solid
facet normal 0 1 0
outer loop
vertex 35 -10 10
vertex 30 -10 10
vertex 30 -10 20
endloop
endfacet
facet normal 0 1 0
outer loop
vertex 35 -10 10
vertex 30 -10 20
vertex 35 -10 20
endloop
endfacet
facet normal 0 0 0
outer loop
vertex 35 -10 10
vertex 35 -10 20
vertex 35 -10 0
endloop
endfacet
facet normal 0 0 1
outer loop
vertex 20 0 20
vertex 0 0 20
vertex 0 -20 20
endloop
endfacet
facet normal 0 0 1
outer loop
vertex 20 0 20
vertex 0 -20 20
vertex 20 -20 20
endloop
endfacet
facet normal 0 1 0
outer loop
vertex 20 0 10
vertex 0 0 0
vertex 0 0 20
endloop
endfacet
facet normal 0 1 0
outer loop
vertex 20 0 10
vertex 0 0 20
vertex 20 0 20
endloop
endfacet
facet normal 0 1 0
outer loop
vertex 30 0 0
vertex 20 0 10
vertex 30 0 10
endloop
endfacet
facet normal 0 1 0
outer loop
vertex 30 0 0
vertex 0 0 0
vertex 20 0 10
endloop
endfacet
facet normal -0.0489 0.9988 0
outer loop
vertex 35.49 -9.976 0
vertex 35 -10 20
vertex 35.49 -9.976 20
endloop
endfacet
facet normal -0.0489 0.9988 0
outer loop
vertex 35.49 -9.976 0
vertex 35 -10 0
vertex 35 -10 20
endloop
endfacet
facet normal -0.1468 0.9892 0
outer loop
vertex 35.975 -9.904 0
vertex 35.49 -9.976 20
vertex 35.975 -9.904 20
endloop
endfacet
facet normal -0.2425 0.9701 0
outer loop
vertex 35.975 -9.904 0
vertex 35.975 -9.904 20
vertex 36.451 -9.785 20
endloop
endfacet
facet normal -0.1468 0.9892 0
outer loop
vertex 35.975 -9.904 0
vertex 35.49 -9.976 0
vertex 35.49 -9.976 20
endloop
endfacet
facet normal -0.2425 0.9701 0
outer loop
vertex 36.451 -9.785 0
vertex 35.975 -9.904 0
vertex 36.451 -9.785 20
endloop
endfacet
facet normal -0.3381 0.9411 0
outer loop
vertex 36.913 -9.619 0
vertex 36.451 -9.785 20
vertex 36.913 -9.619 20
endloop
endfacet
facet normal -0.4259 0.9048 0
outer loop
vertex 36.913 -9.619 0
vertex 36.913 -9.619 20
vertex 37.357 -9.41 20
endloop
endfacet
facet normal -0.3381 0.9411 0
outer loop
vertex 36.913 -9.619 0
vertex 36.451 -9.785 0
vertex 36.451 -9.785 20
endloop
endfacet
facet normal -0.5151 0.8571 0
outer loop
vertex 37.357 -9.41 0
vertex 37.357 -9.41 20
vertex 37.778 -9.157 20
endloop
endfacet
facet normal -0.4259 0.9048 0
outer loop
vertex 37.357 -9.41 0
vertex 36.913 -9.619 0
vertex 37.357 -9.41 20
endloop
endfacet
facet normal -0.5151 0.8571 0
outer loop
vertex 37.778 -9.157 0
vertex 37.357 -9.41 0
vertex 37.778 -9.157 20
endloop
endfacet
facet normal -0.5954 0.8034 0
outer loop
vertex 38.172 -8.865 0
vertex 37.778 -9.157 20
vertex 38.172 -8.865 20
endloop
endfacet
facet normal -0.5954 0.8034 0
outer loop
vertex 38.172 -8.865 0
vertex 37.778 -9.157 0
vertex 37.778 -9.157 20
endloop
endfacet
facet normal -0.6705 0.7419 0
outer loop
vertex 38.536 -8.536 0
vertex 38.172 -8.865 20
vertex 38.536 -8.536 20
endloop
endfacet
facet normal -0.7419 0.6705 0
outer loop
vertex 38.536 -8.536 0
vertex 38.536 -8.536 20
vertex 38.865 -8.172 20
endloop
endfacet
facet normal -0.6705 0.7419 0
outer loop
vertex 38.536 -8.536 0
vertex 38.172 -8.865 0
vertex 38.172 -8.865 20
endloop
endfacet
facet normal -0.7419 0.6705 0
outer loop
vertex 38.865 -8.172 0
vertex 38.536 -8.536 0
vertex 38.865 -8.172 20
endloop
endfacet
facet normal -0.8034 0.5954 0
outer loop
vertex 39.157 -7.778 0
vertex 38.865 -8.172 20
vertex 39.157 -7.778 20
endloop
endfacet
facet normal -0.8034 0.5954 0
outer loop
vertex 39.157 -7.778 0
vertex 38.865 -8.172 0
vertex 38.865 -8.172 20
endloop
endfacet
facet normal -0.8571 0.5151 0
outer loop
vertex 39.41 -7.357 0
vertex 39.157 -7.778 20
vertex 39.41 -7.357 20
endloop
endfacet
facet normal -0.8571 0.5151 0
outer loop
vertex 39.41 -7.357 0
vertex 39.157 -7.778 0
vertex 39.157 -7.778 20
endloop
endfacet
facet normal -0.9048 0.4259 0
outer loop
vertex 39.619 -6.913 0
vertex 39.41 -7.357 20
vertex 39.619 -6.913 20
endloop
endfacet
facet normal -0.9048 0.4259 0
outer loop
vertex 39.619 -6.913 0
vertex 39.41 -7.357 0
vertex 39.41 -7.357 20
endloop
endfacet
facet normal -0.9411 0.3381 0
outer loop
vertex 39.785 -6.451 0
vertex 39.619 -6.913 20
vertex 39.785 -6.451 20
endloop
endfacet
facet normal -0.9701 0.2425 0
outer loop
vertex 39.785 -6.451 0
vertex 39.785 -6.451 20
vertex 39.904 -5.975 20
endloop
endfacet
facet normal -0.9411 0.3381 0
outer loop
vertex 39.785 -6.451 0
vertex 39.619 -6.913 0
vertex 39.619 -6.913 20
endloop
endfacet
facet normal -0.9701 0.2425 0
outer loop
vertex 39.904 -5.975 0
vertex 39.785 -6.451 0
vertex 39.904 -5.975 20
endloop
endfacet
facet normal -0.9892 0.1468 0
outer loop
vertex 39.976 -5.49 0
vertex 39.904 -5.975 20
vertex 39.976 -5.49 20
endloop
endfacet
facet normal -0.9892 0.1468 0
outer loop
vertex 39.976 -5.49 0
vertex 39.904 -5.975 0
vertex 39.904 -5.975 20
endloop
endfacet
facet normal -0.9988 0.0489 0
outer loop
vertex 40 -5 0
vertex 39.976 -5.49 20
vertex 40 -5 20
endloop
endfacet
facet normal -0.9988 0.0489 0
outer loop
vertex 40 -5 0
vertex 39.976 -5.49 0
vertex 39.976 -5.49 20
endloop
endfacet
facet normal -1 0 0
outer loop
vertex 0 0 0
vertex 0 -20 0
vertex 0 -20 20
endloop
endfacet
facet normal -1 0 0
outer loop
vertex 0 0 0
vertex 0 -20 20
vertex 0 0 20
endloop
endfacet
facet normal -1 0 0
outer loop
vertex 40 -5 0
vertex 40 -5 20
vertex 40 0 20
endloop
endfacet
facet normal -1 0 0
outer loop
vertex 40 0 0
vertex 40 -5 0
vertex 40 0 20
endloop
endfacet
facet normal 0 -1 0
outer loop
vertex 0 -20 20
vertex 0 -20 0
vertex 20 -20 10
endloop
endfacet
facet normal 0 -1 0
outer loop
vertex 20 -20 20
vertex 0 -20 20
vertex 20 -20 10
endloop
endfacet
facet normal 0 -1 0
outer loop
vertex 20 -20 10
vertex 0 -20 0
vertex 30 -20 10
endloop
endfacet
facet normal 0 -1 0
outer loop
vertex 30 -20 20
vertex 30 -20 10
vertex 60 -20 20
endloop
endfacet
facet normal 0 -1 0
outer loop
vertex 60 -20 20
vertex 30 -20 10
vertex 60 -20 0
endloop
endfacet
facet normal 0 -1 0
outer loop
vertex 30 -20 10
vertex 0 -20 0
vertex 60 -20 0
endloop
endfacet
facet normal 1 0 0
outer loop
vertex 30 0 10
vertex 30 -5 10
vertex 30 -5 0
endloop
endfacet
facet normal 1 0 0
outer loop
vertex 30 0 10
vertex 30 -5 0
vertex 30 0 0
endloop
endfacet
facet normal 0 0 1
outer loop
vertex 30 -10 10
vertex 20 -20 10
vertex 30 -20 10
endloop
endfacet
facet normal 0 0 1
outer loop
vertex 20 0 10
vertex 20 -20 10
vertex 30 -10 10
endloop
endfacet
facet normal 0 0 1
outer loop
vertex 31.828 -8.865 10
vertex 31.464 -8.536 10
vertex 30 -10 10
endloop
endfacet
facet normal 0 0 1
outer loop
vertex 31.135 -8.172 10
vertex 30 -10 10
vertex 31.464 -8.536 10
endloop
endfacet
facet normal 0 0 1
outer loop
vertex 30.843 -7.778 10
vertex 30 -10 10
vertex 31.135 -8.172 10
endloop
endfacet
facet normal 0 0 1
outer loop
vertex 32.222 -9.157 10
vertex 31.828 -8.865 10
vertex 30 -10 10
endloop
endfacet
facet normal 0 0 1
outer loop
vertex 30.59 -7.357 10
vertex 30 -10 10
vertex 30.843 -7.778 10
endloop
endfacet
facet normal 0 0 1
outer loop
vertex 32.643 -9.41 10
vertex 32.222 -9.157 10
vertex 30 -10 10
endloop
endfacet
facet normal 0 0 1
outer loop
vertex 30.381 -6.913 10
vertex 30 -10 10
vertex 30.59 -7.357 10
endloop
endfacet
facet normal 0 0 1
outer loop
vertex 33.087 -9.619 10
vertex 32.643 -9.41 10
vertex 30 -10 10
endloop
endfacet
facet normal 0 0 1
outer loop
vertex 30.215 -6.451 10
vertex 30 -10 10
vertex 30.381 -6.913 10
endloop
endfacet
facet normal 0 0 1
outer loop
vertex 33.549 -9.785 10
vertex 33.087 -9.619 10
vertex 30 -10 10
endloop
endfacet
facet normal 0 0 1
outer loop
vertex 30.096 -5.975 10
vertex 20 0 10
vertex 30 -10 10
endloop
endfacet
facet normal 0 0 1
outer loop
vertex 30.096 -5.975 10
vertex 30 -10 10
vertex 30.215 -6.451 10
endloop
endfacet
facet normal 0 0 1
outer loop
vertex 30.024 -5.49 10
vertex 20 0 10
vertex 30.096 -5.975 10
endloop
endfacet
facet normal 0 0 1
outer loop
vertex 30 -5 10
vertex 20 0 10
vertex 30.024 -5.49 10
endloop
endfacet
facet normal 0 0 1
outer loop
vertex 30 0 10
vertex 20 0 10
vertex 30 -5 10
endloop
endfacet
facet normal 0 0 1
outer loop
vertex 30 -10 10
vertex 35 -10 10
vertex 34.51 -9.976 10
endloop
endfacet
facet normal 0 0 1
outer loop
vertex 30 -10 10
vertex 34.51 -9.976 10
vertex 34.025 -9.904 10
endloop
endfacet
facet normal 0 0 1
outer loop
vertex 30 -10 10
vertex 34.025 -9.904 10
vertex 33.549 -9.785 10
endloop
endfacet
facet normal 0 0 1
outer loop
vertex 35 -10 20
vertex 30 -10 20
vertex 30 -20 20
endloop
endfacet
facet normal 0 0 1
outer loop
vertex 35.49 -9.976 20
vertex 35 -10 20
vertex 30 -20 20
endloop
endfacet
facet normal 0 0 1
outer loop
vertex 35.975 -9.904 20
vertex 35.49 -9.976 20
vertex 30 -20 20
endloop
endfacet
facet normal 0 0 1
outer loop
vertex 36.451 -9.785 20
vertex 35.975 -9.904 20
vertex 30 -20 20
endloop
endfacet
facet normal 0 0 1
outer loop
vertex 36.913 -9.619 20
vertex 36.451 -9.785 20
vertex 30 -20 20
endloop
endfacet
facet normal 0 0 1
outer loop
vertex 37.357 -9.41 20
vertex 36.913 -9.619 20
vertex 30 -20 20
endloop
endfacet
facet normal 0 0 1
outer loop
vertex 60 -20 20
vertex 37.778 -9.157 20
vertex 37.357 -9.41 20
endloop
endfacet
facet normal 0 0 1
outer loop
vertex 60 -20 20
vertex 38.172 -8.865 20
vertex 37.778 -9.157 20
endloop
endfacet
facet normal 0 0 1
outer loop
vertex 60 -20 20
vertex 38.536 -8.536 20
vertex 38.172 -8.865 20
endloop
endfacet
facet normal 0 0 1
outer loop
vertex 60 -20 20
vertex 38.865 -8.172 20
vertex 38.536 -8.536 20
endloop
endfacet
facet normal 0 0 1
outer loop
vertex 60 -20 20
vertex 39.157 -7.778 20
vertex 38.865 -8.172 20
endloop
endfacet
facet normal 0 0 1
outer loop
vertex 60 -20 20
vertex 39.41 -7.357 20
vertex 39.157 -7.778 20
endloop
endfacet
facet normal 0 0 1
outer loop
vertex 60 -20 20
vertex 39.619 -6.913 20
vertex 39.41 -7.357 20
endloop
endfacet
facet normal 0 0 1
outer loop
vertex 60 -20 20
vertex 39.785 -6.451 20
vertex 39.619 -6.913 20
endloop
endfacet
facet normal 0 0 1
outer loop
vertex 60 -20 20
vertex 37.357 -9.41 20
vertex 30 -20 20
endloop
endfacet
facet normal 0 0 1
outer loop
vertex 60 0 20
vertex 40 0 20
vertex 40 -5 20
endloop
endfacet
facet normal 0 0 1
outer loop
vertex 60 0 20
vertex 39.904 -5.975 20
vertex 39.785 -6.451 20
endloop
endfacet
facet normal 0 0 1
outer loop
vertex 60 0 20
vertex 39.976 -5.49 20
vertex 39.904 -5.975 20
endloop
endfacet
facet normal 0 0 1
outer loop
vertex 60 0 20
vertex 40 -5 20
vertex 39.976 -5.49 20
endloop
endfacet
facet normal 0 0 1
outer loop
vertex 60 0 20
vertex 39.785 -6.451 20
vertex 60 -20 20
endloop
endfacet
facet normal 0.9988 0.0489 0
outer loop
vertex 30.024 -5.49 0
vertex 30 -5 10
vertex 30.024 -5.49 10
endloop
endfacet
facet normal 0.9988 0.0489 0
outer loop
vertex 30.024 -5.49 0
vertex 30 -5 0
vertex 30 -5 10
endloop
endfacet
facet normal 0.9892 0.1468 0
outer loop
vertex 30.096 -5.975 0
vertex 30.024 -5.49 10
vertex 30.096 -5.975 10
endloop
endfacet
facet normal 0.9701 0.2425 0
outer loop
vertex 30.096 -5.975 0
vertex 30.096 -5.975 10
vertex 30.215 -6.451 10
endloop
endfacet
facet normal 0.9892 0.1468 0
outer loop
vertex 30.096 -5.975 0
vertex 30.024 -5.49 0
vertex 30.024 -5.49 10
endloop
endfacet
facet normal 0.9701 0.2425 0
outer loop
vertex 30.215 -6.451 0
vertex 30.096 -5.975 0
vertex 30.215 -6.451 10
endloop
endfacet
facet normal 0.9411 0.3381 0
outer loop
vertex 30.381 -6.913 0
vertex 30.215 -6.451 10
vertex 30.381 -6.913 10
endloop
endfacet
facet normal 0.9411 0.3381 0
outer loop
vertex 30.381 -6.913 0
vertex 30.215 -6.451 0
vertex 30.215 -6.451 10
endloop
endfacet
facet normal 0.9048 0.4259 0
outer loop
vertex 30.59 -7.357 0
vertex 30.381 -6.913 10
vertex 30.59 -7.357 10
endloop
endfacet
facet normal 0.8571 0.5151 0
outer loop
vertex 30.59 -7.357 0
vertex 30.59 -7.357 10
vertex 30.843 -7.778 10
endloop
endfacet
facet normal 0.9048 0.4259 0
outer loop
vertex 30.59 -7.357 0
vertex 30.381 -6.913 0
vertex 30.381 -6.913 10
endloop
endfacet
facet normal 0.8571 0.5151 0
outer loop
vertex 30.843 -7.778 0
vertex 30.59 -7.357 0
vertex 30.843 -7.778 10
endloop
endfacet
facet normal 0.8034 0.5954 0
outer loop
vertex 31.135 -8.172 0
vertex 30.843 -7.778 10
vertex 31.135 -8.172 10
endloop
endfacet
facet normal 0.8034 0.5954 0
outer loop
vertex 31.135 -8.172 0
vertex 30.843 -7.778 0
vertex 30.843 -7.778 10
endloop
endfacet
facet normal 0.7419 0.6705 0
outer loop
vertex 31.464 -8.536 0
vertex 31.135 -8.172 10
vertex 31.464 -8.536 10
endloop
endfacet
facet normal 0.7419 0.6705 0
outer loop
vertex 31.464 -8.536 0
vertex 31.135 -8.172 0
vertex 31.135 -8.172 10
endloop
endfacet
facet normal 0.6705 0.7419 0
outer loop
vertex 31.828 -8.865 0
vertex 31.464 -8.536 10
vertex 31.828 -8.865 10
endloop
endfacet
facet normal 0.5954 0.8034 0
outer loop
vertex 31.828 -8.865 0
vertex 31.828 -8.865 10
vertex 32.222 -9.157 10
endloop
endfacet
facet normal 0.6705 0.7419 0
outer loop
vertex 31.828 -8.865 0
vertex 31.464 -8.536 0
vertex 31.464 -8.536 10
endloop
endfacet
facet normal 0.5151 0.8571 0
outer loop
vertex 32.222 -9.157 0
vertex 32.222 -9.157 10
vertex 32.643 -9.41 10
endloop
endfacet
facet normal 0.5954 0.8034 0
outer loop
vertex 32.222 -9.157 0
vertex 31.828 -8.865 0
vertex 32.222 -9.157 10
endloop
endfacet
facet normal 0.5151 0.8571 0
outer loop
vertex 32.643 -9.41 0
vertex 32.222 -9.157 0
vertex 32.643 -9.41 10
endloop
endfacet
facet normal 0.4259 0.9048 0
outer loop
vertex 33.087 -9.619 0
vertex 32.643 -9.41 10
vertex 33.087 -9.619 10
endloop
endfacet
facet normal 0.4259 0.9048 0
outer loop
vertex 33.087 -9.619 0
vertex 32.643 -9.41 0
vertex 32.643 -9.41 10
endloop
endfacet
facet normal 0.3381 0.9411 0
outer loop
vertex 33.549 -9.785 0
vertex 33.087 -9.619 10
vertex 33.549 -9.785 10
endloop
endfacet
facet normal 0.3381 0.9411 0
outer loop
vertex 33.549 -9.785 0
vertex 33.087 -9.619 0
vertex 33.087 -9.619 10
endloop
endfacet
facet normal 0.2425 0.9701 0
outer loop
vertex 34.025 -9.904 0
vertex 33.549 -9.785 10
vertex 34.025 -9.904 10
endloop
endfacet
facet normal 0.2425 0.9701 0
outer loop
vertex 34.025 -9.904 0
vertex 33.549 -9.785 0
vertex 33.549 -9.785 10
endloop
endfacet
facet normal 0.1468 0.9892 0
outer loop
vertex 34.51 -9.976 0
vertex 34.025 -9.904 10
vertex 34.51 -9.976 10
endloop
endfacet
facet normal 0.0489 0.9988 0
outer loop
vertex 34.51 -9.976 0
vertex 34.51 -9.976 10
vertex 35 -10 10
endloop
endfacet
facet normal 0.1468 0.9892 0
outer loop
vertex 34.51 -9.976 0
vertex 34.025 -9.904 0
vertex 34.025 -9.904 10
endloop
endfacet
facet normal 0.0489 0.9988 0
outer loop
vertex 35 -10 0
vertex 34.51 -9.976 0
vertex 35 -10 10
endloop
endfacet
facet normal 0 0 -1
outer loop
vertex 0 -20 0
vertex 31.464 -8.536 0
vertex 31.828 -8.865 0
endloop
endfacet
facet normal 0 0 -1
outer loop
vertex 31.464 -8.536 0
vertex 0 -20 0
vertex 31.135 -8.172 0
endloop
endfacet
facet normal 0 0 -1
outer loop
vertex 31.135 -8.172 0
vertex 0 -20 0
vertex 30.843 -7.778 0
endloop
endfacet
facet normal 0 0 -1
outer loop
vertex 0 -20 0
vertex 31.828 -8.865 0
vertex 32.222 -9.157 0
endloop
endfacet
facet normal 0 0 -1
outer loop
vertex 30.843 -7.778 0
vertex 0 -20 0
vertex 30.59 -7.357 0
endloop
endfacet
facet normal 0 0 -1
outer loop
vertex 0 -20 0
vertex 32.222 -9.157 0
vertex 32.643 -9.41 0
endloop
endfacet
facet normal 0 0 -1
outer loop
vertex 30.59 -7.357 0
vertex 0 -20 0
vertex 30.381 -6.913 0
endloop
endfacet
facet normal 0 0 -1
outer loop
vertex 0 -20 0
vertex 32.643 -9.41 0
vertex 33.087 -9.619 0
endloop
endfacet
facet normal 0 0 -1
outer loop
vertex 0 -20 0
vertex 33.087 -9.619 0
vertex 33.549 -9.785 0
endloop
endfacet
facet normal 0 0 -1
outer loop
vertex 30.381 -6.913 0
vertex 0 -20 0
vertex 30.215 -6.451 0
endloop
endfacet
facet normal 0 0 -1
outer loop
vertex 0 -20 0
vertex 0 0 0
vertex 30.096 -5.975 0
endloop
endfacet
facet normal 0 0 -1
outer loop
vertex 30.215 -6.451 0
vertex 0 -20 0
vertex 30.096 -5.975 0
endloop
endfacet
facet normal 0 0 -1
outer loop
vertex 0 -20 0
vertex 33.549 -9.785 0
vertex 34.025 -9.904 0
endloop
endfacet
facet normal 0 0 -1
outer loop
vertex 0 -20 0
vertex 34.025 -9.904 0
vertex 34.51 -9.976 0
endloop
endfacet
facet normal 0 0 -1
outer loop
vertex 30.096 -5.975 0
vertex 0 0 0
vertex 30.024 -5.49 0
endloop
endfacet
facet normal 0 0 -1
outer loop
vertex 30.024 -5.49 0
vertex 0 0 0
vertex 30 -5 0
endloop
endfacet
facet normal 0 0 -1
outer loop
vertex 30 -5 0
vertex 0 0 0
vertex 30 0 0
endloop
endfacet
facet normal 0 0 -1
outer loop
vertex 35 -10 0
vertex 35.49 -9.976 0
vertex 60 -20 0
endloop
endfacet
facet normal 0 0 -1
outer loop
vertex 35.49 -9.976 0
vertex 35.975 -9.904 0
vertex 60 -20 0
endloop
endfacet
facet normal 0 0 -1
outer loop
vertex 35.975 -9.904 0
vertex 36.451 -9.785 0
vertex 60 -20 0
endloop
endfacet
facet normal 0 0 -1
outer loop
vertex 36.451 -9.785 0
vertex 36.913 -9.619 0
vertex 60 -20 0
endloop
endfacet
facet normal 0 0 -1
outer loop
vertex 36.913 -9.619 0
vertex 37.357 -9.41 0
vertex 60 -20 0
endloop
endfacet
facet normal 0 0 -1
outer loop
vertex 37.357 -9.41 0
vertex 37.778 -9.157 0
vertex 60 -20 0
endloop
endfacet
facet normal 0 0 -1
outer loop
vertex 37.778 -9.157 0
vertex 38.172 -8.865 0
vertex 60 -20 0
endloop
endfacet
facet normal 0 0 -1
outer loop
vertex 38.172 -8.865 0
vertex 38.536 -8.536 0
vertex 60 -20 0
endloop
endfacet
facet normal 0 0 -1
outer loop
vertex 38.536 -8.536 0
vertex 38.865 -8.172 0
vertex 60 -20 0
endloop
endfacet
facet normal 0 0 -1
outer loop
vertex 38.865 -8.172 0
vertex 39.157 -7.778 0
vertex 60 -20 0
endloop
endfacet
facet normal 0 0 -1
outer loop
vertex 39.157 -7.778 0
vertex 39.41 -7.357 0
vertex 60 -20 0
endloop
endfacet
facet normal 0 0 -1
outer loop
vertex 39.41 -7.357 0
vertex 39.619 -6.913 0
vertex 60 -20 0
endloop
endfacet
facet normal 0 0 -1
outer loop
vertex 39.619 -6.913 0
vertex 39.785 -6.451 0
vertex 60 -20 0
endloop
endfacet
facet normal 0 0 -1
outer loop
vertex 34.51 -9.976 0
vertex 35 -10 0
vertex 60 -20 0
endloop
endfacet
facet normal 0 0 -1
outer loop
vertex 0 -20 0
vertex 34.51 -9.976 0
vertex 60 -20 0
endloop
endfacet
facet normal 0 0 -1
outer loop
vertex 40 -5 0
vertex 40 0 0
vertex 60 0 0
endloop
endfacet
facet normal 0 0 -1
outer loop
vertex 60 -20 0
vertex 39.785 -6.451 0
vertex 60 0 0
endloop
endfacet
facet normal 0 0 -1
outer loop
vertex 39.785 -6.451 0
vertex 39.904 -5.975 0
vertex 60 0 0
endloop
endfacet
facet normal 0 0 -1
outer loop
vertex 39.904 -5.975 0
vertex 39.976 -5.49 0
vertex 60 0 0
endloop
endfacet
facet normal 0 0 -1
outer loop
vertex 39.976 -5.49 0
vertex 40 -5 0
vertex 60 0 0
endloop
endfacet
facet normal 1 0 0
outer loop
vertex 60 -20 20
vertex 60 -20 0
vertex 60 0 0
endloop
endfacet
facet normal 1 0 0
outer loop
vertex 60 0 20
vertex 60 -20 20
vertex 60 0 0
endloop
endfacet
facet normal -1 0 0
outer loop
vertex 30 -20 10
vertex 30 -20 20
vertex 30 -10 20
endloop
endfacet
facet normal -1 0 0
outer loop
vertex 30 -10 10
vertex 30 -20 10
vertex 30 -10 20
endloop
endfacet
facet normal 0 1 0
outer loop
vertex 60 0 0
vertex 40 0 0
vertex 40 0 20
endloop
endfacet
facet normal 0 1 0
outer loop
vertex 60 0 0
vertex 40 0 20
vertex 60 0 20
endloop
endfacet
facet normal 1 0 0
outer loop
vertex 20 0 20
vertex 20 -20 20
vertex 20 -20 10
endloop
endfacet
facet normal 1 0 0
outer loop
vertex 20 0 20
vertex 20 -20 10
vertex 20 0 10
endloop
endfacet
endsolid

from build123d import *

# Parameters (mm, degrees)
F0_W     = 60
F0_H     = 20
F1_DEPTH = 20
F2_W     = 10
F2_H     = 20
F3_DEPTH = 10
F4_W     = 10
F4_H     = 10
F5_DEPTH = 20
F6_R     = 4.99999


# Not quite as in the source:
# - a fillet or chamfer is up to 0.001 mm smaller than in the source, because OpenCascade refuses the exact size


with BuildPart() as f1:
    # F0 (on Top) → F1 (new body)
    with BuildSketch(Plane.XY):
        with Locations((30, -10)):
            Rectangle(F0_W, F0_H)
    extrude(amount=F1_DEPTH)

    # F2 (on face) → F3 (cut)
    with BuildSketch(Plane.XY.offset(20)):
        with Locations((25, -10)):
            Rectangle(F2_W, F2_H)
    extrude(amount=-F3_DEPTH, mode=Mode.SUBTRACT)

    # F4 (on face) → F5 (cut)
    with BuildSketch(Plane.XY.offset(20)):
        with Locations((35, -5)):
            Rectangle(F4_W, F4_H)
    extrude(amount=-F5_DEPTH, mode=Mode.SUBTRACT)

    # F6 (radius 5 in the source; OpenCascade refuses exactly that, so slightly less here)
    f6_edges = [f1.edges().sort_by_distance(p)[0] for p in [
        (30, -10, 5),
        (40, -10, 10),
    ]]
    fillet(f6_edges, radius=F6_R)


solid = f1.part
